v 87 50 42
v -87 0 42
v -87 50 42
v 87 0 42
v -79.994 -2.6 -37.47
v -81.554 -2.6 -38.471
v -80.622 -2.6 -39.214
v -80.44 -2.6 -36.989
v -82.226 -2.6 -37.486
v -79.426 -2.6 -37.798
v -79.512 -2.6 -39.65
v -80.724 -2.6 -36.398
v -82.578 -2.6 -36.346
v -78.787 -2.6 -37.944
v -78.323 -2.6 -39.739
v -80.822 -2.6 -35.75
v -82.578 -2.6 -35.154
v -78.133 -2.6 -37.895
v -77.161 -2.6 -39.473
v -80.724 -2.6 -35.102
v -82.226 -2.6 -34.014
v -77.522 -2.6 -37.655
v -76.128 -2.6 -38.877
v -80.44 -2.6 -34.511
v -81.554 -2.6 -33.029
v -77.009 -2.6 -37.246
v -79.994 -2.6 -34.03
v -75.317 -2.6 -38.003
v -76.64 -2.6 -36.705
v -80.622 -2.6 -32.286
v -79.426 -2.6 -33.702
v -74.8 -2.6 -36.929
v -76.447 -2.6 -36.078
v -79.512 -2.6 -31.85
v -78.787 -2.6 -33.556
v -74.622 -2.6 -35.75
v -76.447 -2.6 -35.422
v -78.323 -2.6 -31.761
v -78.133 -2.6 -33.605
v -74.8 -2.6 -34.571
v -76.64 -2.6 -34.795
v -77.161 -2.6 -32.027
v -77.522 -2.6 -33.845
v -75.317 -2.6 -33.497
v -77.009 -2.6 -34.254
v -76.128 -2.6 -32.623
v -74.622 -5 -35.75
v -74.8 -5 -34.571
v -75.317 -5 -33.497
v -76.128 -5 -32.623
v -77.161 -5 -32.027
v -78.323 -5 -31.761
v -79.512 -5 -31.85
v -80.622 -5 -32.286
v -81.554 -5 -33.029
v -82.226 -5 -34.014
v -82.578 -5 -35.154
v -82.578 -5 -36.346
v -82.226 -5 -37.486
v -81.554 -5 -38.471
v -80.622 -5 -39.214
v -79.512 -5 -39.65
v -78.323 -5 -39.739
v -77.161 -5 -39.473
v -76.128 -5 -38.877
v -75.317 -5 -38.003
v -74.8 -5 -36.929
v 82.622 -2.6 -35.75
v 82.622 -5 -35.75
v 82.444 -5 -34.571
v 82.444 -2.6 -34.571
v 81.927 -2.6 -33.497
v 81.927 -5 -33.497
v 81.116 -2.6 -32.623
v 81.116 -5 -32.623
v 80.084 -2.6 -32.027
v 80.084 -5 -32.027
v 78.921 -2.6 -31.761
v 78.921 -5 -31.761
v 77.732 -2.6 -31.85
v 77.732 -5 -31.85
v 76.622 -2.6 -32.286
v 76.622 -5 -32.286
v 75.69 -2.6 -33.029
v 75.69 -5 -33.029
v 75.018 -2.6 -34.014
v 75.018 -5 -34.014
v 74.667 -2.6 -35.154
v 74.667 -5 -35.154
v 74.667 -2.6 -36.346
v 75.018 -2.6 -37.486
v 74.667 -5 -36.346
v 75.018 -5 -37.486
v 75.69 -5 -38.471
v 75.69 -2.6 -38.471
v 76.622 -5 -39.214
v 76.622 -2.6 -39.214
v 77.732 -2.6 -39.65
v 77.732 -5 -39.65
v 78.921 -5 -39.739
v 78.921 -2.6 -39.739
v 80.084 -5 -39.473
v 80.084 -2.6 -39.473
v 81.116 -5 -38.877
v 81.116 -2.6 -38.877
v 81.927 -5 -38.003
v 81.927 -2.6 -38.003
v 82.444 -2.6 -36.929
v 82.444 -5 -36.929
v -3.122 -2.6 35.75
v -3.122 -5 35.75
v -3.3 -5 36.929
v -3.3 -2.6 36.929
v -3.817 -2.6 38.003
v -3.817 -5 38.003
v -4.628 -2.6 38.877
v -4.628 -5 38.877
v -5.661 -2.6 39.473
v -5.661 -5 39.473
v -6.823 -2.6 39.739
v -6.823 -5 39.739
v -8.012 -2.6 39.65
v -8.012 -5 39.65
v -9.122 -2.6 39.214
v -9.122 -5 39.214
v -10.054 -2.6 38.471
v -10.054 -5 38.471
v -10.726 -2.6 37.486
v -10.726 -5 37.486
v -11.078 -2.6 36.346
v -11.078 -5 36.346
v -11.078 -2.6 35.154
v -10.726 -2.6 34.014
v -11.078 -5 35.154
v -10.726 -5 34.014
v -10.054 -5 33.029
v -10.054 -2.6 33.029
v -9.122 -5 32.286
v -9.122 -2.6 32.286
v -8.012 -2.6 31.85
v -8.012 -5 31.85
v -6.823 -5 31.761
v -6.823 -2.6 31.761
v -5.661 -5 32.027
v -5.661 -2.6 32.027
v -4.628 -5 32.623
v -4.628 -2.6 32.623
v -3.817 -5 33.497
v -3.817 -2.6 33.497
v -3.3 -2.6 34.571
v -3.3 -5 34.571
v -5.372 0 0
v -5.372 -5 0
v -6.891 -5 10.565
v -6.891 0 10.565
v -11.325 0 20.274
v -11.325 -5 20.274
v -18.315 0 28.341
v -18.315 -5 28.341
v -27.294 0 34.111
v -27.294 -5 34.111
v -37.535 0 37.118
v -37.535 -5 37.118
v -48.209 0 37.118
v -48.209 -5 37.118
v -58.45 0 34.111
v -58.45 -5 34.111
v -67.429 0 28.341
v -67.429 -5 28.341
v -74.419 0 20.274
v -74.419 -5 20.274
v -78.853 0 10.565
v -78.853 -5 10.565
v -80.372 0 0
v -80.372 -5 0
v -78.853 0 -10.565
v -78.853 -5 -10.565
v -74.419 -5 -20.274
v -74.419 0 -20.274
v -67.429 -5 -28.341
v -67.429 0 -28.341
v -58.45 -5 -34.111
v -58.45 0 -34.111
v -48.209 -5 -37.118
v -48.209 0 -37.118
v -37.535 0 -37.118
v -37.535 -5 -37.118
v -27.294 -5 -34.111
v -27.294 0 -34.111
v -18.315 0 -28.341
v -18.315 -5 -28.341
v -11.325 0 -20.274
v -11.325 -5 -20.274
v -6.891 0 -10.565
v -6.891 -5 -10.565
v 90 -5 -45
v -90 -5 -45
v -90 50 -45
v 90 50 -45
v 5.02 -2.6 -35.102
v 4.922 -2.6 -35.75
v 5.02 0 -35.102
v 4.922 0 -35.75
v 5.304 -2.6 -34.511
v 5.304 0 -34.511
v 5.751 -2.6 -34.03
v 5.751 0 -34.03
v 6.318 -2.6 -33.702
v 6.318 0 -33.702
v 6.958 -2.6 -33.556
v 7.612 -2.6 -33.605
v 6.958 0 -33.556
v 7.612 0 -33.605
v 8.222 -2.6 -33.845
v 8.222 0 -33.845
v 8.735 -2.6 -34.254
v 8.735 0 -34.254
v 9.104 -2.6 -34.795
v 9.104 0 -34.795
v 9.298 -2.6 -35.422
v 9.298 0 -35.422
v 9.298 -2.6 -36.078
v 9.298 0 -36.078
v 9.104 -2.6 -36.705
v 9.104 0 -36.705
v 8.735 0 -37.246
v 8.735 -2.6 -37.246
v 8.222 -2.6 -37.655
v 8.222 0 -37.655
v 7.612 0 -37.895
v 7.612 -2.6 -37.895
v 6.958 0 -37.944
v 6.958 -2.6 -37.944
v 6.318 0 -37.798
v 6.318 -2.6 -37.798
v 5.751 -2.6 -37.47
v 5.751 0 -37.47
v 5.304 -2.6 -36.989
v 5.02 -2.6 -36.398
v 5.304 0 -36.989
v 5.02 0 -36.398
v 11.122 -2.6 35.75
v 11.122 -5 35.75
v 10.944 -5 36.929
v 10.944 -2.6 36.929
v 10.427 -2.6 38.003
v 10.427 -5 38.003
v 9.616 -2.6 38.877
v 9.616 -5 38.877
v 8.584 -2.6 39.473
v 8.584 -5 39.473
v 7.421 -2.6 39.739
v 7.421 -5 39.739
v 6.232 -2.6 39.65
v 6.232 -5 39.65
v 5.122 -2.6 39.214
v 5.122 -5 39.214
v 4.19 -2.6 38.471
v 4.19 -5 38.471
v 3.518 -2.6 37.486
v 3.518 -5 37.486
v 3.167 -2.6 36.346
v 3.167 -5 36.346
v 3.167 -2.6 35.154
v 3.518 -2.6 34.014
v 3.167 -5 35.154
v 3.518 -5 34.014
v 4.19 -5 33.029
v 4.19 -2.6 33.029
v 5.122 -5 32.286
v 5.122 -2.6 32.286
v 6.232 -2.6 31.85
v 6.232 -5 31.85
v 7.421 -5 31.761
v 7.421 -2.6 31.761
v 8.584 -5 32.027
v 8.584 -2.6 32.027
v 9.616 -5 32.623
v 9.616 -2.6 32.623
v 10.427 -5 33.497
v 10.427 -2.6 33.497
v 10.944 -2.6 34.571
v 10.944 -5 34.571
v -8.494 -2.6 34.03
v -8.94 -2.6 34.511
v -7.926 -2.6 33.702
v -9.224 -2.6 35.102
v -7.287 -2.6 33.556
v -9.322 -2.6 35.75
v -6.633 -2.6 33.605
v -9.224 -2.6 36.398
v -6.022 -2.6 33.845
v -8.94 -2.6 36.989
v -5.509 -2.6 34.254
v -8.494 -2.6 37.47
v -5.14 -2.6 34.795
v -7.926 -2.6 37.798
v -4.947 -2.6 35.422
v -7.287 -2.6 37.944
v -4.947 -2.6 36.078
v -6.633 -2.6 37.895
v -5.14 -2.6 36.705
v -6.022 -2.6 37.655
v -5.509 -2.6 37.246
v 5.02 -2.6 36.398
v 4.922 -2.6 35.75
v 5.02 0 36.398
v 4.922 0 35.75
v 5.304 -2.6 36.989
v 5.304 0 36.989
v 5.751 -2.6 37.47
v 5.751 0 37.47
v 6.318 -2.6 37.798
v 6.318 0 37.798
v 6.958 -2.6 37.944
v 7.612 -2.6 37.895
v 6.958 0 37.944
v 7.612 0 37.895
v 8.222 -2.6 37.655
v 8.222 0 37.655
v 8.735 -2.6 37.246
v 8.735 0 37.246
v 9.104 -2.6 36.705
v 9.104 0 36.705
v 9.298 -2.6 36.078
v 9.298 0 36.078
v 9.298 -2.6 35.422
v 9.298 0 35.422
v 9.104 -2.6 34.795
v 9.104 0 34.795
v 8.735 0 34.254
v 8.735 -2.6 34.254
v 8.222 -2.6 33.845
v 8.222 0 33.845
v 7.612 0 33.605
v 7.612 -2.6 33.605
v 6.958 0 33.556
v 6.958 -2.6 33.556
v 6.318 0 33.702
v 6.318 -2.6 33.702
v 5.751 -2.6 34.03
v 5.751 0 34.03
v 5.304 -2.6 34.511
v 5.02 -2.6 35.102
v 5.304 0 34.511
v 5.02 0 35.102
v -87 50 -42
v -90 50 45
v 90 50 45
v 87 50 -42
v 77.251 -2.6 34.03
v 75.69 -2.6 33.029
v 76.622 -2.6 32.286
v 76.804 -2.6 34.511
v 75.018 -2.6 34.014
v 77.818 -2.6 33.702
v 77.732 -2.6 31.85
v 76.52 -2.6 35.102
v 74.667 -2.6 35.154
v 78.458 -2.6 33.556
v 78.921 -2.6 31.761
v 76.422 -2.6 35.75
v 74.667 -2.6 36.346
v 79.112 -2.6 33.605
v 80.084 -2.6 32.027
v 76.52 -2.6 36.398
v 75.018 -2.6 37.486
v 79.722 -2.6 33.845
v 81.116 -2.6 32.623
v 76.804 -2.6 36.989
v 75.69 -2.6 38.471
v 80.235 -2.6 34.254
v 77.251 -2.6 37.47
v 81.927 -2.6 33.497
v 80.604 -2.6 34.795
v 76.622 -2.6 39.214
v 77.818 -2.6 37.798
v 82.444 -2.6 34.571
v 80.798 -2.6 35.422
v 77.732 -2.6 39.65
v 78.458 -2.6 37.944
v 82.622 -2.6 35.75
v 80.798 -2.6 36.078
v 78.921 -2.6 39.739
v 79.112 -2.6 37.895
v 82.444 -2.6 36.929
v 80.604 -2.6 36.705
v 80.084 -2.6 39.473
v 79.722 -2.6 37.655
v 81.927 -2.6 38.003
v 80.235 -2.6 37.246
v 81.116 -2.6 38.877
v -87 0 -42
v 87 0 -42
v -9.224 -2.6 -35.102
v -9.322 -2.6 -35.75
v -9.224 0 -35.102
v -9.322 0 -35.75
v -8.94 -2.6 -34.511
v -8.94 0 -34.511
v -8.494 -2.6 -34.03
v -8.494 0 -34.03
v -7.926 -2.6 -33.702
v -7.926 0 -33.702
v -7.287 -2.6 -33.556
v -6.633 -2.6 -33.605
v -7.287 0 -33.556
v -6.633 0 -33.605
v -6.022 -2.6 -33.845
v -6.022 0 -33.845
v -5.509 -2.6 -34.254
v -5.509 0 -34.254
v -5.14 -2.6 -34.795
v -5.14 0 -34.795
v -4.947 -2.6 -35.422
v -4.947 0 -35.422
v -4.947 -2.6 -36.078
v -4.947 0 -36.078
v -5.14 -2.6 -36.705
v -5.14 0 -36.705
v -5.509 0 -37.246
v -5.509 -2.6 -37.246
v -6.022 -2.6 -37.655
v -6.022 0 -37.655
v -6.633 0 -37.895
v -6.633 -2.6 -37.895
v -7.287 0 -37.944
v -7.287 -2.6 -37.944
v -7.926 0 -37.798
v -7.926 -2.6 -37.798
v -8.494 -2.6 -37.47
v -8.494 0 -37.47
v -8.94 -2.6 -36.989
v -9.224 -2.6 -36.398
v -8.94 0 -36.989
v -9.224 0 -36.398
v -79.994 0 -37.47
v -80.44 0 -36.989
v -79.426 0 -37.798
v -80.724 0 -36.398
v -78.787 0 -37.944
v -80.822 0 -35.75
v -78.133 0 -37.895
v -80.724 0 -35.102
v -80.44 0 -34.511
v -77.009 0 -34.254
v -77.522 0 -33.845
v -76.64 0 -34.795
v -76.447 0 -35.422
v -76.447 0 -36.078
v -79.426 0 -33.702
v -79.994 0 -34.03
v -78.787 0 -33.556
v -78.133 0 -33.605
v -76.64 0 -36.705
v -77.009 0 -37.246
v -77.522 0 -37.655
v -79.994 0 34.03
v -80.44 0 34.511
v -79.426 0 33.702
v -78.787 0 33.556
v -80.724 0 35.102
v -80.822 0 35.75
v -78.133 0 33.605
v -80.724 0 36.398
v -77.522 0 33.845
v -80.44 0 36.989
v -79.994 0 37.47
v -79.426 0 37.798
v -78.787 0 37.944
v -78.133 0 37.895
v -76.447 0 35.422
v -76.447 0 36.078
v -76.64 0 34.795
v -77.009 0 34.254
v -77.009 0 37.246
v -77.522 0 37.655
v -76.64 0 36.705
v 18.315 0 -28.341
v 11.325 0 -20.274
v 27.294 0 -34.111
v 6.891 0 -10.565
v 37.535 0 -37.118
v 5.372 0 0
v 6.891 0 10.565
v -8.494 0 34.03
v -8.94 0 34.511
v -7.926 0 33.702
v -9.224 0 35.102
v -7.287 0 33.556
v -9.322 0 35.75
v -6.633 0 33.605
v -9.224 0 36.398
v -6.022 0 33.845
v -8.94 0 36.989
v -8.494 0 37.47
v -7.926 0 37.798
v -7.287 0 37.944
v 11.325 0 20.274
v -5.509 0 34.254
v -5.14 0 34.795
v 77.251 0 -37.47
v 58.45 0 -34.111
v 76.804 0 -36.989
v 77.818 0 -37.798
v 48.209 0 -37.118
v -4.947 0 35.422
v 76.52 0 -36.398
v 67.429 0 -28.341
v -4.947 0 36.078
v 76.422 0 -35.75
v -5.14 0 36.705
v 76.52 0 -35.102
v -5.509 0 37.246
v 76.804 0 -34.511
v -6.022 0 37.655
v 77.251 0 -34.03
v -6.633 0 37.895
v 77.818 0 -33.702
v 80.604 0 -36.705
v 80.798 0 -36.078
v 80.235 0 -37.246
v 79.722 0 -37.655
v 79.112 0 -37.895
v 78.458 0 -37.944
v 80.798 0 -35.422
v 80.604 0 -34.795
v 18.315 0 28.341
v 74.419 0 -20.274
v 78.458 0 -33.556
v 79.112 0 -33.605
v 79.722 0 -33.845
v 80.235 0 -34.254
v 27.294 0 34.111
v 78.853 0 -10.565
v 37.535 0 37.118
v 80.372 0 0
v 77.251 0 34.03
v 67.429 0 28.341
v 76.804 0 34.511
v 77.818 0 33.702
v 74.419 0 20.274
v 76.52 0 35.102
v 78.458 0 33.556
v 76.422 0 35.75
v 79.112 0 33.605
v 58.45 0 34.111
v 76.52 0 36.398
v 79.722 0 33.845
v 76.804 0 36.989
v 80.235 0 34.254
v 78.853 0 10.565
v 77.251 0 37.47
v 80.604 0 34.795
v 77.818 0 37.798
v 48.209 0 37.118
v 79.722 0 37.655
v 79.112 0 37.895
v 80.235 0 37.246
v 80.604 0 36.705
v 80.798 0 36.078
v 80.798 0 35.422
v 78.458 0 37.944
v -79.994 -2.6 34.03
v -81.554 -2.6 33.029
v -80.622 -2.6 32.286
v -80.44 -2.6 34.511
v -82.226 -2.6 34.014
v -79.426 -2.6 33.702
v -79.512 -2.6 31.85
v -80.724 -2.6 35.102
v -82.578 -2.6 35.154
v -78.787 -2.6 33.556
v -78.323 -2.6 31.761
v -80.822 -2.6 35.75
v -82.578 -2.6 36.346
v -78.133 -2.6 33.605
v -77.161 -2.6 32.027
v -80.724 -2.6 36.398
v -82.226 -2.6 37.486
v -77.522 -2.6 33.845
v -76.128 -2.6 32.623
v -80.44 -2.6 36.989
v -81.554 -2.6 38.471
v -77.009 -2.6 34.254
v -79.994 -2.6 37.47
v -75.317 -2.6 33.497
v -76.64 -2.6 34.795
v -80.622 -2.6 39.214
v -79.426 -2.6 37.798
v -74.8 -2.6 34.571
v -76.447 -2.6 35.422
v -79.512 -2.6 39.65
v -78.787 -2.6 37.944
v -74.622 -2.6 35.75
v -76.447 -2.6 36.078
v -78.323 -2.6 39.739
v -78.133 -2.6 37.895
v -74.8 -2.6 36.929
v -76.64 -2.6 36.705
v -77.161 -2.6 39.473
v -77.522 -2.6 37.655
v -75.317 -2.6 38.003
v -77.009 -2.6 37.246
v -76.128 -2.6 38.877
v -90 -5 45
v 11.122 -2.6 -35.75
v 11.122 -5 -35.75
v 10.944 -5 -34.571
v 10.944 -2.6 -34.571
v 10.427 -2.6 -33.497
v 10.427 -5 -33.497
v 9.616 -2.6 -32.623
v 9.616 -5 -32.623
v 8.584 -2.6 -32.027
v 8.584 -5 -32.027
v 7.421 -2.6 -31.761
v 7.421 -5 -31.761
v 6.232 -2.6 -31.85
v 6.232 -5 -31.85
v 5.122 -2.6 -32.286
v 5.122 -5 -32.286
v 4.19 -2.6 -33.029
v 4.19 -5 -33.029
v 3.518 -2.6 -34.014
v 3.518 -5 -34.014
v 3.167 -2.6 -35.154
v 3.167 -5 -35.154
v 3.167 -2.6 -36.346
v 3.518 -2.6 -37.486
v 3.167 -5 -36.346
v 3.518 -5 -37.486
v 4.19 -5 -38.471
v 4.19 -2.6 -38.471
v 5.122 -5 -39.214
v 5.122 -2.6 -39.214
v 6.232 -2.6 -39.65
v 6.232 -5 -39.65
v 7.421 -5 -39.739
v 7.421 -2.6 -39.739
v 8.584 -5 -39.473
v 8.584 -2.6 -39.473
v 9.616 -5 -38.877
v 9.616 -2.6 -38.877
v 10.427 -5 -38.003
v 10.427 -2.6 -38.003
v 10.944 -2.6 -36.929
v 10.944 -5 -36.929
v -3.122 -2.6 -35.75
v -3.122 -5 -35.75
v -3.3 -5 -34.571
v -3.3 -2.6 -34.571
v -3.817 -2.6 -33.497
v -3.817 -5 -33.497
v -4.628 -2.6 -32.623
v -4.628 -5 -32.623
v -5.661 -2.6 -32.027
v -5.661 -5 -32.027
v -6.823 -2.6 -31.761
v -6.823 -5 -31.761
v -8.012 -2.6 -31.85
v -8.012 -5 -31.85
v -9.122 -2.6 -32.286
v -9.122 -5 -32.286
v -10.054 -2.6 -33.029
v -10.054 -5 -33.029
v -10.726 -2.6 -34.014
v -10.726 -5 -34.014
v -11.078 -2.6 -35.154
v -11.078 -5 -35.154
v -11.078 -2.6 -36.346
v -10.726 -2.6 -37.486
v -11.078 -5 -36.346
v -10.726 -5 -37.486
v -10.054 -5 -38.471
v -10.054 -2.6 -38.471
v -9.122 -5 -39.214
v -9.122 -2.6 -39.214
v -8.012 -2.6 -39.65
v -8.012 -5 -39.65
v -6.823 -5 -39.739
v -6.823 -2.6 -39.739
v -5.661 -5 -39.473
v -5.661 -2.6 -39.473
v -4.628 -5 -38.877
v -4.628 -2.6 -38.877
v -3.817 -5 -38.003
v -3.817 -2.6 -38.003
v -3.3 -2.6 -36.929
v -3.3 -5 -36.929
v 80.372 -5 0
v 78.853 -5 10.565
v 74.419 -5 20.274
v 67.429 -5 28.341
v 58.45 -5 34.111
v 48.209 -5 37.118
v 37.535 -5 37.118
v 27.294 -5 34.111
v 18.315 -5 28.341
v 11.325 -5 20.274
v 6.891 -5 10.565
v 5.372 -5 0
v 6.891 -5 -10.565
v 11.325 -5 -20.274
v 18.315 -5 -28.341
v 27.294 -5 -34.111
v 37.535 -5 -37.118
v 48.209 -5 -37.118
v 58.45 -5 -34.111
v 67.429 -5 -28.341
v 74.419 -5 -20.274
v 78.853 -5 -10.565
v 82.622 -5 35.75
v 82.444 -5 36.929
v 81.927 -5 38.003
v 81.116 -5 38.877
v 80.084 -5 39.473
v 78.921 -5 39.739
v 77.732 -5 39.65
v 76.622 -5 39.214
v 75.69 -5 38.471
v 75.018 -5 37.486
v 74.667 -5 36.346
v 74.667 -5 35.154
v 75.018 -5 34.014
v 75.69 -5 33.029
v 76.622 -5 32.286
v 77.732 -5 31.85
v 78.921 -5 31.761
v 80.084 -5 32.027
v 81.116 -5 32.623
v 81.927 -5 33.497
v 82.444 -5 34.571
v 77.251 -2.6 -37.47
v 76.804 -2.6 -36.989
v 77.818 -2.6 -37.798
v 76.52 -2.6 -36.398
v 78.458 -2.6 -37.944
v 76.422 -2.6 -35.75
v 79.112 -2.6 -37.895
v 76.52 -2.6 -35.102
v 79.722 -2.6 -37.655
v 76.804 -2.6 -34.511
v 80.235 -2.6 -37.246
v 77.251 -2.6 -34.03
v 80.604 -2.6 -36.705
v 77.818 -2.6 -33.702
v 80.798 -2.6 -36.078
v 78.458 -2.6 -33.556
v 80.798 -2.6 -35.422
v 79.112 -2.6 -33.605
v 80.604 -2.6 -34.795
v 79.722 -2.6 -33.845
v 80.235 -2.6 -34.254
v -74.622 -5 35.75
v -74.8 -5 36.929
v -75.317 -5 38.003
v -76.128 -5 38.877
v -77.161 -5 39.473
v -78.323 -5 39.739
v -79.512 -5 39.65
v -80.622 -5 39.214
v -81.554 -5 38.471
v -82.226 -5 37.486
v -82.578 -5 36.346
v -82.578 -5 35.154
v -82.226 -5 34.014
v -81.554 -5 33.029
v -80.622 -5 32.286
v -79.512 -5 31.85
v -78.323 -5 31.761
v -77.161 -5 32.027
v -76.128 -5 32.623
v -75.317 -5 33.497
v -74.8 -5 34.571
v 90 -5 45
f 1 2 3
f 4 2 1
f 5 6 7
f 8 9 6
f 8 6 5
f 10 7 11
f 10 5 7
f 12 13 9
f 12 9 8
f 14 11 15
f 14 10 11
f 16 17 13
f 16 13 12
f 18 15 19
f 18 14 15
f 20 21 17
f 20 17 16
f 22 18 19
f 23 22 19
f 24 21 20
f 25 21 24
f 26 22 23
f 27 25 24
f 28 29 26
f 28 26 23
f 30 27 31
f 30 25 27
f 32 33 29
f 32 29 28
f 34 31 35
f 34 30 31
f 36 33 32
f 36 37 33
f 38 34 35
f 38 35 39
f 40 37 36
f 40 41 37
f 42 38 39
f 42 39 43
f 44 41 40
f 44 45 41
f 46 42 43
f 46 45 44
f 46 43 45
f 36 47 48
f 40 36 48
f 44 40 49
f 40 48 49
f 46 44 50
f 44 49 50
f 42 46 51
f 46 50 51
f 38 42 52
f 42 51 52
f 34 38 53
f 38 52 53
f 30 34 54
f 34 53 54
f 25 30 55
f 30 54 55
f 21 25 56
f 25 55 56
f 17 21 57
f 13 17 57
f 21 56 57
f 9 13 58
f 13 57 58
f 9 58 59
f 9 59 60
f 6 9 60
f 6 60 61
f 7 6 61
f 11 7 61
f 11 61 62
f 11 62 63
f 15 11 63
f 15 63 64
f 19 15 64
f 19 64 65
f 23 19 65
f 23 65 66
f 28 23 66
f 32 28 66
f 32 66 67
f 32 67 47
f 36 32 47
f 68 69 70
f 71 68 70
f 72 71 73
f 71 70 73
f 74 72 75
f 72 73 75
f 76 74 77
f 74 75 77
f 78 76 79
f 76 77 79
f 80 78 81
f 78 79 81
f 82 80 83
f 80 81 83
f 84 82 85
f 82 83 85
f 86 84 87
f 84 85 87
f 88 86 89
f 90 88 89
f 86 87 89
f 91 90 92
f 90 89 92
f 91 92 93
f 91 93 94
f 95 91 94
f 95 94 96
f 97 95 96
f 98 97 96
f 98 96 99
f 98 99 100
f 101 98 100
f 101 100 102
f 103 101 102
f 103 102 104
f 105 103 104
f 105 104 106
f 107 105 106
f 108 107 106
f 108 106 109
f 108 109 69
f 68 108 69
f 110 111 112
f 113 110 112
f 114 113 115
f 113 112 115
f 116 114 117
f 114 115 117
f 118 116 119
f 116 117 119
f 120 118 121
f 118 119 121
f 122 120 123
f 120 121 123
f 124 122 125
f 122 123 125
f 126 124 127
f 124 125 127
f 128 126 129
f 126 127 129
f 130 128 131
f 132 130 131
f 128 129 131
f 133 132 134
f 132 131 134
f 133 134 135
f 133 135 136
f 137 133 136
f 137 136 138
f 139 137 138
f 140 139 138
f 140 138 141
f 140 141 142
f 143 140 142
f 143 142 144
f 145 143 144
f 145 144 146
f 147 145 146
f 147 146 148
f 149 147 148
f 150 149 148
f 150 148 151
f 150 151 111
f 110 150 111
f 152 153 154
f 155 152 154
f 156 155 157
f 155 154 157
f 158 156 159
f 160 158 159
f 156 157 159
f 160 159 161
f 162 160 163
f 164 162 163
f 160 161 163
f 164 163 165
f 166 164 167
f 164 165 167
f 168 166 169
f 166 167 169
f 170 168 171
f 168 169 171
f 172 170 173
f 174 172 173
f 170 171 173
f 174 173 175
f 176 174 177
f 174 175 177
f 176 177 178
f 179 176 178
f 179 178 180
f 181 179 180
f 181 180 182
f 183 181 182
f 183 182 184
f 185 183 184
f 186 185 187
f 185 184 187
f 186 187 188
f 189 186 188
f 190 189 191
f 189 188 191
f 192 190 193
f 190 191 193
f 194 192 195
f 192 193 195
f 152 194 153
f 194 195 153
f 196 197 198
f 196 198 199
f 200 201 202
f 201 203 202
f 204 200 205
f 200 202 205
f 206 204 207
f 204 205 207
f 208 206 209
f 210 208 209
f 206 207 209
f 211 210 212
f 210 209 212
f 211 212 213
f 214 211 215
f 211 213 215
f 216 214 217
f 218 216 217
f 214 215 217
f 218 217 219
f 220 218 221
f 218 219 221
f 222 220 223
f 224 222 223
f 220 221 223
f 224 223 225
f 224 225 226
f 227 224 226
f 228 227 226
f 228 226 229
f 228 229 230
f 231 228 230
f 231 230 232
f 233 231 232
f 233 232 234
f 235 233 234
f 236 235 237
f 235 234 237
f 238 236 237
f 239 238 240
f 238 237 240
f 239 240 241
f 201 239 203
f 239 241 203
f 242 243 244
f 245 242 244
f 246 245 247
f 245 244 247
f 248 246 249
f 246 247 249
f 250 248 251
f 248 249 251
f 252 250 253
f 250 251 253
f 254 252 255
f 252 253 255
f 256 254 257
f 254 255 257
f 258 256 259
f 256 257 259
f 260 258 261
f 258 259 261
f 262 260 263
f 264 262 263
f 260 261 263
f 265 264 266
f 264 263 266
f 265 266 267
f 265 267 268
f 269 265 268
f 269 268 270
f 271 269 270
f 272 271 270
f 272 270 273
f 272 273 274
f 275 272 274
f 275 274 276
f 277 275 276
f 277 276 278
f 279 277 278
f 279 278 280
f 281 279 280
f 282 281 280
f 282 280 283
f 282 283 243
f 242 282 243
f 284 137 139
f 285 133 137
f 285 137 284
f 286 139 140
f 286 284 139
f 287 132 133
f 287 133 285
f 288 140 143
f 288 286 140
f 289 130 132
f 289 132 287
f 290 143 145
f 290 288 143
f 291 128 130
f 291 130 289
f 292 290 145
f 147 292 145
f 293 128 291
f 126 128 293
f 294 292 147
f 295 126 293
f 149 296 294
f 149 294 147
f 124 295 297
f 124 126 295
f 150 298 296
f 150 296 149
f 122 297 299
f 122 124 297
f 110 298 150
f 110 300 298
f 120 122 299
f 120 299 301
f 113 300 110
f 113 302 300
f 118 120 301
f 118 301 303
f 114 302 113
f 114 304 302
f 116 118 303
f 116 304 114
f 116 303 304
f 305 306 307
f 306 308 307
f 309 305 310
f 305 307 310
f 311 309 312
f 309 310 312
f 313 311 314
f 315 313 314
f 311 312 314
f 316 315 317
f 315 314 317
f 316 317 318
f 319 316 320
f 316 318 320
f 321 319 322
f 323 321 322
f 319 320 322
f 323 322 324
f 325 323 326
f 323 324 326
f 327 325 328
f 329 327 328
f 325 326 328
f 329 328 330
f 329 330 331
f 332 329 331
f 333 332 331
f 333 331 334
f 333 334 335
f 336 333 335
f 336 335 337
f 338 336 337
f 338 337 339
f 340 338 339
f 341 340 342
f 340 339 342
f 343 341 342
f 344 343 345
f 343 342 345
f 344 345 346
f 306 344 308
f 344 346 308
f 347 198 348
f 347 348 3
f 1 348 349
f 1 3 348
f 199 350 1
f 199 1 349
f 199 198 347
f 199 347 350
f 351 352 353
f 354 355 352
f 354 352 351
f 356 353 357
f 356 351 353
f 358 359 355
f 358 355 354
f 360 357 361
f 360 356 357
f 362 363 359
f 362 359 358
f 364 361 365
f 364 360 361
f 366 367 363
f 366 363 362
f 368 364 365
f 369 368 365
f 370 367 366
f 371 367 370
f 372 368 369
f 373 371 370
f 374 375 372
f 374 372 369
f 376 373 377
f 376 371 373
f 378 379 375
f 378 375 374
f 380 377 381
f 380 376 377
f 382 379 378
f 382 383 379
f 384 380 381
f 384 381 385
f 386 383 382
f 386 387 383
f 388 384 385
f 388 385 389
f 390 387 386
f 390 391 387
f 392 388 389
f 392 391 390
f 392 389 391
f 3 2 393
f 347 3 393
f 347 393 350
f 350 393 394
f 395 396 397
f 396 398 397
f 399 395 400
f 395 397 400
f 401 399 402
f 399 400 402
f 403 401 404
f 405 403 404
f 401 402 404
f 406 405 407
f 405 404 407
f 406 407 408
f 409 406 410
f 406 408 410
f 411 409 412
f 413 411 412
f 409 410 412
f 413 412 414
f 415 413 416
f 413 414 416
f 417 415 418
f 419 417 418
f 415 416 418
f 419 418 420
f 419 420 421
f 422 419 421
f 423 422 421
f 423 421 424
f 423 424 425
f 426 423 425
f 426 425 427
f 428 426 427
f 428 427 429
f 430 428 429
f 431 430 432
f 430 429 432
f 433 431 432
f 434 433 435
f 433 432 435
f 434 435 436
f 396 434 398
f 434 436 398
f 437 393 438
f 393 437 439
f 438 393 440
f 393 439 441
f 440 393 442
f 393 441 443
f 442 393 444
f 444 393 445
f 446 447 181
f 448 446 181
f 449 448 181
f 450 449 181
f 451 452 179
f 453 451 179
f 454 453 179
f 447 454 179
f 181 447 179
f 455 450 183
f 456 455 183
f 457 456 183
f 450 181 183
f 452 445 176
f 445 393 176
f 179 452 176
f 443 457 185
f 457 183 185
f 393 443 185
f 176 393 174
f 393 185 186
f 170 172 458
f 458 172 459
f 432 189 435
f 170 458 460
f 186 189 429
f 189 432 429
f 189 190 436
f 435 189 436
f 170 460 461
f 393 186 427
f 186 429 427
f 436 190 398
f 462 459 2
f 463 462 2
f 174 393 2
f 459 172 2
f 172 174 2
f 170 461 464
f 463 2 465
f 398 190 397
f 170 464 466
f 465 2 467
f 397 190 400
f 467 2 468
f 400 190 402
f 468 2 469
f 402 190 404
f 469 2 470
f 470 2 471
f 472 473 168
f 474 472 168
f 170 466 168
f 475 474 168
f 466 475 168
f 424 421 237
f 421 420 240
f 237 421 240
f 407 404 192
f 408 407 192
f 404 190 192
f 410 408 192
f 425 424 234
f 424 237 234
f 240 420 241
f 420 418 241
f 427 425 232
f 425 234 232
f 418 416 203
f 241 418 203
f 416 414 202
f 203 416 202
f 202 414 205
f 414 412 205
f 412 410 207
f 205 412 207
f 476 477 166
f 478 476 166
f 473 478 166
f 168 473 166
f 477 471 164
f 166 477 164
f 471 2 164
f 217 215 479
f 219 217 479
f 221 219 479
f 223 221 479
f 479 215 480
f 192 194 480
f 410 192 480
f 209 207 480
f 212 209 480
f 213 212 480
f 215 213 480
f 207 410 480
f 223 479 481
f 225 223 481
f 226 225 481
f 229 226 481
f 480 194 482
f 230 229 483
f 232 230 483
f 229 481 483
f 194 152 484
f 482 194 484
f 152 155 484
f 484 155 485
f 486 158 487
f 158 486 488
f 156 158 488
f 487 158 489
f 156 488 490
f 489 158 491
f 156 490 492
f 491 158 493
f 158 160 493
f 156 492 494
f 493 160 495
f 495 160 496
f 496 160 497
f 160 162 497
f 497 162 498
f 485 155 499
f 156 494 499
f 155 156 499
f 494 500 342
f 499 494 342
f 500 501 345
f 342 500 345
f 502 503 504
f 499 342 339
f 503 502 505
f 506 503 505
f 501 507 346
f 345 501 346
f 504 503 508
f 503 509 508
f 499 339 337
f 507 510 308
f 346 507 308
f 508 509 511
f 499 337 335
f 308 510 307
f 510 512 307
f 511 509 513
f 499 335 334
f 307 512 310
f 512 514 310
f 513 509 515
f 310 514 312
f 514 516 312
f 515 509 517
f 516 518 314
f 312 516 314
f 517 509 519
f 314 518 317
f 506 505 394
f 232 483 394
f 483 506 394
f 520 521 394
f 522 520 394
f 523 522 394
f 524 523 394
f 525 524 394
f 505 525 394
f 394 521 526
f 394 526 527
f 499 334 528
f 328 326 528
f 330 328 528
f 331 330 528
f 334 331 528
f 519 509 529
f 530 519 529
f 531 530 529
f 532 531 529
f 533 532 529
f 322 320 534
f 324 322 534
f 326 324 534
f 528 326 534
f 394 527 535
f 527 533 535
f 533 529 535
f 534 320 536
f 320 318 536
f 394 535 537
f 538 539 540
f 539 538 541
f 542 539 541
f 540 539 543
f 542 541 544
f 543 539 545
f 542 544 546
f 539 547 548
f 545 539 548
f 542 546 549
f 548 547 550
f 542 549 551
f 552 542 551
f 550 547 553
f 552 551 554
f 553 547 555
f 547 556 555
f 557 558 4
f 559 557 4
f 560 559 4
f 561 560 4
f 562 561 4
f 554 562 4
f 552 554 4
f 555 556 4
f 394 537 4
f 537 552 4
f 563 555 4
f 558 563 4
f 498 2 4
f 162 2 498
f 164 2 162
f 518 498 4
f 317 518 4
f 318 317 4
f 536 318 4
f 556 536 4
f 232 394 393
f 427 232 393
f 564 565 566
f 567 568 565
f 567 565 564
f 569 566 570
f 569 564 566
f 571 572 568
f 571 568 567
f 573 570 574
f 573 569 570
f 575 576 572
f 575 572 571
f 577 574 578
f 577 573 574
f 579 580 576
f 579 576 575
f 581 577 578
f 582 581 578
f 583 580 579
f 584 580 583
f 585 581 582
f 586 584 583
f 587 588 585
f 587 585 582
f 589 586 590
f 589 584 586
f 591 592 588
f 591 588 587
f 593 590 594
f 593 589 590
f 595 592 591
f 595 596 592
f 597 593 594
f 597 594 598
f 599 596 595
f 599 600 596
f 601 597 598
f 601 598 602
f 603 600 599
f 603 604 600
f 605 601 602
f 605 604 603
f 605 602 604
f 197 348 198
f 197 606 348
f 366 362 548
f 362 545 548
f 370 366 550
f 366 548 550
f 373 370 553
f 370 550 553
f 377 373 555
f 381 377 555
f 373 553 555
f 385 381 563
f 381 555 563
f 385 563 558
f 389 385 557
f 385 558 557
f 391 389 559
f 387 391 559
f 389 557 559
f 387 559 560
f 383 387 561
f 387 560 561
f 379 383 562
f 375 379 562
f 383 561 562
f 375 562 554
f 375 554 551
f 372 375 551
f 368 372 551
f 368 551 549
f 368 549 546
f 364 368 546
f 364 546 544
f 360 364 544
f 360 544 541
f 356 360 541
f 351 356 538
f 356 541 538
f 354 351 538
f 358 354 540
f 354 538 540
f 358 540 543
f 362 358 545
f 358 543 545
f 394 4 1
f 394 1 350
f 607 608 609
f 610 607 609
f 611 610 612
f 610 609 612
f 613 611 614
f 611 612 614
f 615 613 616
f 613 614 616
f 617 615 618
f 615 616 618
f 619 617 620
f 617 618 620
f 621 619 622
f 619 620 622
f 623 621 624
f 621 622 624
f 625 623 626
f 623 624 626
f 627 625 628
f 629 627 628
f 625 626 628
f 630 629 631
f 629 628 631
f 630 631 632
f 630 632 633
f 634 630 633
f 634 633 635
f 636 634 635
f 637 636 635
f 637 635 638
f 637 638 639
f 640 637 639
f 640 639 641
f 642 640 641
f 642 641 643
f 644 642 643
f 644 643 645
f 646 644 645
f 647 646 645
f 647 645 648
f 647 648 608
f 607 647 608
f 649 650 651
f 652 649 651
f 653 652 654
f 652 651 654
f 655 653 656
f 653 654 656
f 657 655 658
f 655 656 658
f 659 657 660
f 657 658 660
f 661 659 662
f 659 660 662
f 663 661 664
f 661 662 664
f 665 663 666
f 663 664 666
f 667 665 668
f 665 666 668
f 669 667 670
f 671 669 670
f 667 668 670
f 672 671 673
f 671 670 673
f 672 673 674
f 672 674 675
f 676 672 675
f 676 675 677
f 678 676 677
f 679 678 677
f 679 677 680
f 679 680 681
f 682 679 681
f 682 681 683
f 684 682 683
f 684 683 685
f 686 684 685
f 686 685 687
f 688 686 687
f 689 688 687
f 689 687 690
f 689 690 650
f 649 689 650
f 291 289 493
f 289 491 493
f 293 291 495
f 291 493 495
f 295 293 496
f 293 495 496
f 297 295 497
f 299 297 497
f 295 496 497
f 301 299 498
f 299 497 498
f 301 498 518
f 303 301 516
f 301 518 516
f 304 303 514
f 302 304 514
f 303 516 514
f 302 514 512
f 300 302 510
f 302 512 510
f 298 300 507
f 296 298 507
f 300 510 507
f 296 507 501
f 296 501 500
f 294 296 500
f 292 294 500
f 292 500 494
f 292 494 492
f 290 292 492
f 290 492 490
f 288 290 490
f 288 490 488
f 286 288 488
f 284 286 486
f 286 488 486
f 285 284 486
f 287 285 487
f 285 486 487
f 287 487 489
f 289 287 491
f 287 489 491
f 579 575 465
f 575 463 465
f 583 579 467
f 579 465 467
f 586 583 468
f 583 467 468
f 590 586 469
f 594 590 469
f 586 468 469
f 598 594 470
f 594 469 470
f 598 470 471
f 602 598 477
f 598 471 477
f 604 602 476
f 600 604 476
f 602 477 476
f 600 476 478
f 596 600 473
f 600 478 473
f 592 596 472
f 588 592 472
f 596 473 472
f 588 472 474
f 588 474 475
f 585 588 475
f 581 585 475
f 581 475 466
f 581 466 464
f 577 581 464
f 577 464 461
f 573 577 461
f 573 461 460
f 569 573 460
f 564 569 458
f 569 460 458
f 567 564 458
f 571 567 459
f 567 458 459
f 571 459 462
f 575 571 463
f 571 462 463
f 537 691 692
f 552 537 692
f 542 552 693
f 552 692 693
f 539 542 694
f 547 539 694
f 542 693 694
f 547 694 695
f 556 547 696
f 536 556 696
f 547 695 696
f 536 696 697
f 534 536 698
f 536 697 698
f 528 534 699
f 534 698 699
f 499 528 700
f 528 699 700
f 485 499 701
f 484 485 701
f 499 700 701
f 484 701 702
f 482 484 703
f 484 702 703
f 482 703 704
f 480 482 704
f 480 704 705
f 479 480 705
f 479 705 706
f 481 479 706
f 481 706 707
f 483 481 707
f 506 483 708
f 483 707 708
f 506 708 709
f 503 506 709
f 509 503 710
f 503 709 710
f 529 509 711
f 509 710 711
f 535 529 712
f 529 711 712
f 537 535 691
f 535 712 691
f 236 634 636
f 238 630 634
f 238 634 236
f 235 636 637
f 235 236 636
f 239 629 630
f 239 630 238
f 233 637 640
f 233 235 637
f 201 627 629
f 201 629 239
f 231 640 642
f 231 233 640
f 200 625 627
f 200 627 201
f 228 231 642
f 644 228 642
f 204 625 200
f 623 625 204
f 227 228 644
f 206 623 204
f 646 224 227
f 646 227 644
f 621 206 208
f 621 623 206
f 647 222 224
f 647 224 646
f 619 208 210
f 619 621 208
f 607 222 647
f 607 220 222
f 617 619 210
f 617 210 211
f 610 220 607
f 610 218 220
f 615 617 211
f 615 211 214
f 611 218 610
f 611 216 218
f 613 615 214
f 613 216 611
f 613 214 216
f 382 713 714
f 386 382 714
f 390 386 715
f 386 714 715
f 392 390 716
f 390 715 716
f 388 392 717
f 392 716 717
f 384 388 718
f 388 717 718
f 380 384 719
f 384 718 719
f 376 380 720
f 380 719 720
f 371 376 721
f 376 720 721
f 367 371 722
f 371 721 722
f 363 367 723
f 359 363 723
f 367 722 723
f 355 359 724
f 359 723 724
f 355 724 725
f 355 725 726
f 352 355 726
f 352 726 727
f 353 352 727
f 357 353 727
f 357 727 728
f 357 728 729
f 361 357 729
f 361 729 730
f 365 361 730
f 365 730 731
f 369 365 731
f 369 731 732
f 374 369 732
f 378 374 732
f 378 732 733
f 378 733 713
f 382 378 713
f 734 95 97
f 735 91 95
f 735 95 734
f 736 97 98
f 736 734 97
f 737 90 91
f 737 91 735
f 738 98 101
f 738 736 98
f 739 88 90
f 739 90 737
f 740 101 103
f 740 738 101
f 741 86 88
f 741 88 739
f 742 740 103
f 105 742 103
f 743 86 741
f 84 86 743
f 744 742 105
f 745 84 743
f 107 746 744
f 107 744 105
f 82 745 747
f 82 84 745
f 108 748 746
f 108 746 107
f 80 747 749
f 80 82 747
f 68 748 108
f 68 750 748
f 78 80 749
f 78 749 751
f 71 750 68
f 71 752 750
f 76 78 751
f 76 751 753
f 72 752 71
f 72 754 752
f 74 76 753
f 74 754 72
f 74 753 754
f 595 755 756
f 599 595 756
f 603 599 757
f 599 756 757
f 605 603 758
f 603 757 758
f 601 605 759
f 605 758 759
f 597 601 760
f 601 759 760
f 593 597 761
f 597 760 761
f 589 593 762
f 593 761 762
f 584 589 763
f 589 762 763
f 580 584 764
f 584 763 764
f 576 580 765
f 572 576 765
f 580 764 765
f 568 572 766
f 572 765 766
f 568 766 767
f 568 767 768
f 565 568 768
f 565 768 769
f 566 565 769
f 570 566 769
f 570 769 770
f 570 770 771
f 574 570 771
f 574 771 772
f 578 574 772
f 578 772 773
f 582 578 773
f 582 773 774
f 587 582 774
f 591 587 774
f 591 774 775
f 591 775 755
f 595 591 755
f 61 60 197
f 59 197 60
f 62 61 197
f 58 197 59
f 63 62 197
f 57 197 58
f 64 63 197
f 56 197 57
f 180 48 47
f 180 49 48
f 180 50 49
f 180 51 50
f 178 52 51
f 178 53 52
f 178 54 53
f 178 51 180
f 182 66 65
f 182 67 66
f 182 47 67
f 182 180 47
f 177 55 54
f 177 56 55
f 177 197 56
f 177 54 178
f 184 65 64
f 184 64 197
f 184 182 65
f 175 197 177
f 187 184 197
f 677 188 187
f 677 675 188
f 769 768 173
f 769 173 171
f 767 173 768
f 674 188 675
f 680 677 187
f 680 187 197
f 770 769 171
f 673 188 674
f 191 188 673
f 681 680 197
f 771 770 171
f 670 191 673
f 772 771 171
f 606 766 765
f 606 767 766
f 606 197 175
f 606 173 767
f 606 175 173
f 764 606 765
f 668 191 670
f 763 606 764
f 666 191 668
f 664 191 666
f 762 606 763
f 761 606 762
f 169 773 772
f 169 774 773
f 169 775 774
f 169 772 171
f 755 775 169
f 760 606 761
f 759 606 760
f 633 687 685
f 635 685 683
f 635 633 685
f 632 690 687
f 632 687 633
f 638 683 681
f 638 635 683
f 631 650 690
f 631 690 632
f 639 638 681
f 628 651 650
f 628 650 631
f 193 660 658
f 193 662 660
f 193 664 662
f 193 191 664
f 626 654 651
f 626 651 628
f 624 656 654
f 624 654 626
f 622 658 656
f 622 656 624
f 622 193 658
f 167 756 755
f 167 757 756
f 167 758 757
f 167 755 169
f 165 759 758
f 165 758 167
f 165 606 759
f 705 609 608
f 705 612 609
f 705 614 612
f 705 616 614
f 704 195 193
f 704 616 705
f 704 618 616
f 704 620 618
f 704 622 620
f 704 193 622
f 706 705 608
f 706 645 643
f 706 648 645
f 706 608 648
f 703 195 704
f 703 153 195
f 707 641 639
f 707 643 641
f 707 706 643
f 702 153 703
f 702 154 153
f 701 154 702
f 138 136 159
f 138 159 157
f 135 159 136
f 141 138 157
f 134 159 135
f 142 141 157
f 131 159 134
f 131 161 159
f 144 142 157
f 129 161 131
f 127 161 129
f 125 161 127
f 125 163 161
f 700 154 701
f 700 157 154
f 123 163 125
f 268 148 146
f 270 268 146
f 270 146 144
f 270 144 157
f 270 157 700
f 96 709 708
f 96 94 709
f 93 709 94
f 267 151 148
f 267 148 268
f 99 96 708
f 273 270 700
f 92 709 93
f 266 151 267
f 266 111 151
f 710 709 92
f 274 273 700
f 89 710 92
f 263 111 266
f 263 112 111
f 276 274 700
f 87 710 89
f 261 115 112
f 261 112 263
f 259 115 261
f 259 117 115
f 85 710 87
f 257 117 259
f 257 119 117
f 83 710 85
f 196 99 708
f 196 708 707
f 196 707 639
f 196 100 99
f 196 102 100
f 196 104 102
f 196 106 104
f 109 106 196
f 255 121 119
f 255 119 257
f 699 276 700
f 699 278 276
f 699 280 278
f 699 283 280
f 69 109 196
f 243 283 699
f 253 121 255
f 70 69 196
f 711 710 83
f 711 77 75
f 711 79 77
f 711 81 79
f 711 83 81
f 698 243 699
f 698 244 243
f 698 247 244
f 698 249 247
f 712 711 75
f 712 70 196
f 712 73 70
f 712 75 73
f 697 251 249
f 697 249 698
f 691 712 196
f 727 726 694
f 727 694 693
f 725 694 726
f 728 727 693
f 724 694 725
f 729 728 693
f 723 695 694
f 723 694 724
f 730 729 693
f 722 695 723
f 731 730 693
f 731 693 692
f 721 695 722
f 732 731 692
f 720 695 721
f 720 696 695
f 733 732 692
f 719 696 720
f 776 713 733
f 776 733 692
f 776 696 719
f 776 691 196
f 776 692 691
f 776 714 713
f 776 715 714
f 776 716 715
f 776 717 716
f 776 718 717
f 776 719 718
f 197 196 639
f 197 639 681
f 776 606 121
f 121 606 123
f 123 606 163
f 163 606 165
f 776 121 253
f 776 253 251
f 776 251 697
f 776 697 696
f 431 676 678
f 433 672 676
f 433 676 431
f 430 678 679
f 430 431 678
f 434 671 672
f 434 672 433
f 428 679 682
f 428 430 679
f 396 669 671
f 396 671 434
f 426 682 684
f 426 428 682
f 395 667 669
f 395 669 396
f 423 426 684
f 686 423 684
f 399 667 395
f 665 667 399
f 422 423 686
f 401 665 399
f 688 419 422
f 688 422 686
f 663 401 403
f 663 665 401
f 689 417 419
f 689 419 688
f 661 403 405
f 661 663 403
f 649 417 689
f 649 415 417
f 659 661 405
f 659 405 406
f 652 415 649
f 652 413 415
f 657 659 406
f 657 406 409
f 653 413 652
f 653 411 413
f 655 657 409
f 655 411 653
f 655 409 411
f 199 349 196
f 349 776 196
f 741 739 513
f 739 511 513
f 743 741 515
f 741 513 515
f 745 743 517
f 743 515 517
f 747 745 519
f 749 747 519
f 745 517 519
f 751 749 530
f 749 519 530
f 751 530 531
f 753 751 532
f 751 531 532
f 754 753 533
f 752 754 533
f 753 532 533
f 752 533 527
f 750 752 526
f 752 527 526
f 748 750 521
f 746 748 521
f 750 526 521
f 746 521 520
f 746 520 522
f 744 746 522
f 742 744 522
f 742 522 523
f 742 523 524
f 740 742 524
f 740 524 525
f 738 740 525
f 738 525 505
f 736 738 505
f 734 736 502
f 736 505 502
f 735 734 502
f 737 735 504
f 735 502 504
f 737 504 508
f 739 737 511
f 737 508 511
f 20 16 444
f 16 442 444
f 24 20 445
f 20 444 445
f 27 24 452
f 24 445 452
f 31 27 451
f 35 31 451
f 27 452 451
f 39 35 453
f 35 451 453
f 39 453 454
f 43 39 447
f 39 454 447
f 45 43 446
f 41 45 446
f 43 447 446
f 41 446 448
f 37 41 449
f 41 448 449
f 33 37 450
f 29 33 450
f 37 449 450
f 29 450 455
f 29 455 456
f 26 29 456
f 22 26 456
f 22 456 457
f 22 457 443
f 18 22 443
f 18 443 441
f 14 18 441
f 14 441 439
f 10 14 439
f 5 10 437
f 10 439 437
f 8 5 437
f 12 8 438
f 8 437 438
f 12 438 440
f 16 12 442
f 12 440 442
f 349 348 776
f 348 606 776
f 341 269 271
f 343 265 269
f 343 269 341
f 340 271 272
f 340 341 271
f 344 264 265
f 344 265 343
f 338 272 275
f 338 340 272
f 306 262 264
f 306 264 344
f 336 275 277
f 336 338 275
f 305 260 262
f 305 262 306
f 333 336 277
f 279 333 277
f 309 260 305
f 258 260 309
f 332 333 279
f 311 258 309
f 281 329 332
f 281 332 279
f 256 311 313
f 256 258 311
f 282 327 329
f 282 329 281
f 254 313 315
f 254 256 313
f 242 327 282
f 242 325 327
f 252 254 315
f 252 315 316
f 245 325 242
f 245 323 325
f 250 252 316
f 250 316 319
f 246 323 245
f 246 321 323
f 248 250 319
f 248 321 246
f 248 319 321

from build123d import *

# Parameters (mm, degrees)
SKETCH_W         = 180
SKETCH_H         = 90
PAD_DEPTH        = 5
SKETCH001_R      = 37.5
POCKET_DEPTH     = 5
HOLE_D           = 4.4
HOLE_DEPTH       = 25
HOLE_CBORE_D     = 8
HOLE_CBORE_DEPTH = 2.4
SKETCH003_W      = 180
SKETCH003_H      = 90
SKETCH003_W_2    = 174
SKETCH003_H_2    = 84
PAD001_DEPTH     = 50


with BuildPart() as part:
    # Sketch → Pad (new body)
    with BuildSketch(Plane.XZ):
        Rectangle(SKETCH_W, SKETCH_H)
    extrude(amount=PAD_DEPTH)

    # Sketch001 (on Face6 of Pad) → Pocket (cut)
    with BuildSketch(Plane.XZ.offset(5)):
        with Locations((-42.872203, 0)):
            Circle(SKETCH001_R)
        with Locations((42.872203, 0)):
            Circle(SKETCH001_R)
    extrude(amount=-POCKET_DEPTH, mode=Mode.SUBTRACT)

    # Hole
    with Locations(Plane.XZ.offset(5)):
        with Locations((-78.622203, 35.75), (-7.122203, 35.75), (-78.622203, -35.75), (-7.122203, -35.75), (7.122203, 35.75), (78.622203, 35.75), (78.622203, -35.75), (7.122203, -35.75)):
            CounterBoreHole(HOLE_D / 2, HOLE_CBORE_D / 2, HOLE_CBORE_DEPTH, depth=HOLE_DEPTH)

    # Sketch003 (on Face5 of Pad) → Pad001 (join)
    with BuildSketch(Plane(origin=(0, 0, 0), x_dir=(1, 0, 0), z_dir=(0, 1, 0))):
        Rectangle(SKETCH003_W, SKETCH003_H)
        Rectangle(SKETCH003_W_2, SKETCH003_H_2, mode=Mode.SUBTRACT)
    extrude(amount=PAD001_DEPTH)


solid = part.part
